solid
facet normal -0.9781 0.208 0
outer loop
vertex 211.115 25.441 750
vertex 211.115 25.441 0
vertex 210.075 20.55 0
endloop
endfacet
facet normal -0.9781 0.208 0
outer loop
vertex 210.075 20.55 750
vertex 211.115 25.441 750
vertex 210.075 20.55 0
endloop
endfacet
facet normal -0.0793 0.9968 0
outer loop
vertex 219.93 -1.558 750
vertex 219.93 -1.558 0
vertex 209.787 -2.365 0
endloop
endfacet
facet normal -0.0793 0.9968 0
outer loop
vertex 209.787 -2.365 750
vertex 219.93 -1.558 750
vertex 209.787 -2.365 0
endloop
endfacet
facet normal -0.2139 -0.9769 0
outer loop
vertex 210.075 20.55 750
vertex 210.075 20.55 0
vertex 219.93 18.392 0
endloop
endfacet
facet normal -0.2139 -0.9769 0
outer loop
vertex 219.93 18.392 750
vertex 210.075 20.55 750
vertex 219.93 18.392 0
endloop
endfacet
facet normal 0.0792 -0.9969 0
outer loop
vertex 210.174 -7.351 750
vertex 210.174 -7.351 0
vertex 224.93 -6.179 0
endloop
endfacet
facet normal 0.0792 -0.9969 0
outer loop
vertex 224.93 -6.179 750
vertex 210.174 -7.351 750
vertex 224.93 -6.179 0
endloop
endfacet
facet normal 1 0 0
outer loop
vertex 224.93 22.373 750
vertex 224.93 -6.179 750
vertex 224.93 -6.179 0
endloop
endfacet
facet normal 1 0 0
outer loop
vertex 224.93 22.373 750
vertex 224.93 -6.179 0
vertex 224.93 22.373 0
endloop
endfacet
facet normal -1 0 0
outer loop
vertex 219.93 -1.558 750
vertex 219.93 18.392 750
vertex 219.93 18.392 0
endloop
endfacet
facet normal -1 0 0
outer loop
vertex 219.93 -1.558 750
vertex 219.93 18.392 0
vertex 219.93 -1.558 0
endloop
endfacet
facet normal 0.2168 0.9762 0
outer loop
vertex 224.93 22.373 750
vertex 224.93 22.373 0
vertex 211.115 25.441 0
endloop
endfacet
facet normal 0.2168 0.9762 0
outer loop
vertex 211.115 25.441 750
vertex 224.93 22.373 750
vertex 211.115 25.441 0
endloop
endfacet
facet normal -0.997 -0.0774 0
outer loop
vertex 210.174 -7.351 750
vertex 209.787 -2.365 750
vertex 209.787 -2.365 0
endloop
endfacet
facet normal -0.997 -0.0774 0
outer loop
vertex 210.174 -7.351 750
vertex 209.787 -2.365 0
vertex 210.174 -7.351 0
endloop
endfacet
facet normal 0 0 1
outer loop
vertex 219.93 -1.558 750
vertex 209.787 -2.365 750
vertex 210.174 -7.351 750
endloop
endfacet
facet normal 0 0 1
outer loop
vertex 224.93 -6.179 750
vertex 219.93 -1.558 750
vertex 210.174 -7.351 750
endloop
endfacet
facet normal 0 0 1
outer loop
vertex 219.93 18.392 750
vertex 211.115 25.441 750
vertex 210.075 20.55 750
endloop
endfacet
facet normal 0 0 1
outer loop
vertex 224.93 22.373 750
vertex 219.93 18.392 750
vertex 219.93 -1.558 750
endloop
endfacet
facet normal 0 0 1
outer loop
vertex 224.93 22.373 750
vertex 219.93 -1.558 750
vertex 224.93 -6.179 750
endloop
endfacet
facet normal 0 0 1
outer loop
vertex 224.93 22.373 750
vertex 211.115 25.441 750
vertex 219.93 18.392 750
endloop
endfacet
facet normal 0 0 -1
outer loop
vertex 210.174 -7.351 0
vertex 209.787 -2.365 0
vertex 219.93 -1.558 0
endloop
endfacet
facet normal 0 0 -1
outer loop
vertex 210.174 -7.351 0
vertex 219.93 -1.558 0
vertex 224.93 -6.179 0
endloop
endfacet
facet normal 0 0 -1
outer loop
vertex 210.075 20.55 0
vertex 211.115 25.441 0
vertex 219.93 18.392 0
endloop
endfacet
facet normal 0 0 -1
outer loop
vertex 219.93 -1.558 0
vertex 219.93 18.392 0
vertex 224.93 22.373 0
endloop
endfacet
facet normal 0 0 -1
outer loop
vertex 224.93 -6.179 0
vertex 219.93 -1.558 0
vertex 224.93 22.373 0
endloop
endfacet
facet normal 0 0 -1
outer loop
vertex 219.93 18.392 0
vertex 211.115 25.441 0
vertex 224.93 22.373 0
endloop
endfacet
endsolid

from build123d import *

# Parameters (mm, degrees)
BOSS_EXTRUDE1_DEPTH = 750


with BuildPart() as part:
    # Master sketch-Wing Geometry Master Sketc → Boss-Extrude1 (new body)
    with BuildSketch(Plane.XY):
        with BuildLine():
            Line((224.93, -6.178926254), (224.93, 22.373189537))
            add(Edge.make_bspline(
                [(224.93, 22.373189537), (223.937151031, 22.604229635), (221.53569088, 23.158078559), (217.696277573, 24.019984904), (214.083050592, 24.807059628), (211.880072571, 25.27832033), (211.114806417, 25.441064095)],
                knots=[0.125197771, 0.125197771, 0.125197771, 0.125197771, 0.130088746, 0.137022467, 0.144077656, 0.147831525, 0.147831525, 0.147831525, 0.147831525], degree=3))
            Line((211.114806417, 25.441064095), (210.07475011, 20.55043194))
            Line((210.07475011, 20.55043194), (219.93, 18.391622486))
            Line((219.93, 18.391622486), (219.93, -1.558186688))
            Line((219.93, -1.558186688), (209.78690169, -2.365451127))
            Line((209.78690169, -2.365451127), (210.173597999, -7.350571372))
            add(Edge.make_bspline(
                [(210.173597999, -7.350571372), (210.519069964, -7.323773075), (212.294721257, -7.18589941), (215.480211959, -6.932652125), (219.709739235, -6.590064586), (222.853288837, -6.342418671), (224.586664849, -6.205927526), (224.93, -6.178926254)],
                knots=[0.856037867, 0.856037867, 0.856037867, 0.856037867, 0.857700425, 0.864583105, 0.871370128, 0.878060224, 0.879712638, 0.879712638, 0.879712638, 0.879712638], degree=3))
        make_face()
    extrude(amount=BOSS_EXTRUDE1_DEPTH)


solid = part.part
